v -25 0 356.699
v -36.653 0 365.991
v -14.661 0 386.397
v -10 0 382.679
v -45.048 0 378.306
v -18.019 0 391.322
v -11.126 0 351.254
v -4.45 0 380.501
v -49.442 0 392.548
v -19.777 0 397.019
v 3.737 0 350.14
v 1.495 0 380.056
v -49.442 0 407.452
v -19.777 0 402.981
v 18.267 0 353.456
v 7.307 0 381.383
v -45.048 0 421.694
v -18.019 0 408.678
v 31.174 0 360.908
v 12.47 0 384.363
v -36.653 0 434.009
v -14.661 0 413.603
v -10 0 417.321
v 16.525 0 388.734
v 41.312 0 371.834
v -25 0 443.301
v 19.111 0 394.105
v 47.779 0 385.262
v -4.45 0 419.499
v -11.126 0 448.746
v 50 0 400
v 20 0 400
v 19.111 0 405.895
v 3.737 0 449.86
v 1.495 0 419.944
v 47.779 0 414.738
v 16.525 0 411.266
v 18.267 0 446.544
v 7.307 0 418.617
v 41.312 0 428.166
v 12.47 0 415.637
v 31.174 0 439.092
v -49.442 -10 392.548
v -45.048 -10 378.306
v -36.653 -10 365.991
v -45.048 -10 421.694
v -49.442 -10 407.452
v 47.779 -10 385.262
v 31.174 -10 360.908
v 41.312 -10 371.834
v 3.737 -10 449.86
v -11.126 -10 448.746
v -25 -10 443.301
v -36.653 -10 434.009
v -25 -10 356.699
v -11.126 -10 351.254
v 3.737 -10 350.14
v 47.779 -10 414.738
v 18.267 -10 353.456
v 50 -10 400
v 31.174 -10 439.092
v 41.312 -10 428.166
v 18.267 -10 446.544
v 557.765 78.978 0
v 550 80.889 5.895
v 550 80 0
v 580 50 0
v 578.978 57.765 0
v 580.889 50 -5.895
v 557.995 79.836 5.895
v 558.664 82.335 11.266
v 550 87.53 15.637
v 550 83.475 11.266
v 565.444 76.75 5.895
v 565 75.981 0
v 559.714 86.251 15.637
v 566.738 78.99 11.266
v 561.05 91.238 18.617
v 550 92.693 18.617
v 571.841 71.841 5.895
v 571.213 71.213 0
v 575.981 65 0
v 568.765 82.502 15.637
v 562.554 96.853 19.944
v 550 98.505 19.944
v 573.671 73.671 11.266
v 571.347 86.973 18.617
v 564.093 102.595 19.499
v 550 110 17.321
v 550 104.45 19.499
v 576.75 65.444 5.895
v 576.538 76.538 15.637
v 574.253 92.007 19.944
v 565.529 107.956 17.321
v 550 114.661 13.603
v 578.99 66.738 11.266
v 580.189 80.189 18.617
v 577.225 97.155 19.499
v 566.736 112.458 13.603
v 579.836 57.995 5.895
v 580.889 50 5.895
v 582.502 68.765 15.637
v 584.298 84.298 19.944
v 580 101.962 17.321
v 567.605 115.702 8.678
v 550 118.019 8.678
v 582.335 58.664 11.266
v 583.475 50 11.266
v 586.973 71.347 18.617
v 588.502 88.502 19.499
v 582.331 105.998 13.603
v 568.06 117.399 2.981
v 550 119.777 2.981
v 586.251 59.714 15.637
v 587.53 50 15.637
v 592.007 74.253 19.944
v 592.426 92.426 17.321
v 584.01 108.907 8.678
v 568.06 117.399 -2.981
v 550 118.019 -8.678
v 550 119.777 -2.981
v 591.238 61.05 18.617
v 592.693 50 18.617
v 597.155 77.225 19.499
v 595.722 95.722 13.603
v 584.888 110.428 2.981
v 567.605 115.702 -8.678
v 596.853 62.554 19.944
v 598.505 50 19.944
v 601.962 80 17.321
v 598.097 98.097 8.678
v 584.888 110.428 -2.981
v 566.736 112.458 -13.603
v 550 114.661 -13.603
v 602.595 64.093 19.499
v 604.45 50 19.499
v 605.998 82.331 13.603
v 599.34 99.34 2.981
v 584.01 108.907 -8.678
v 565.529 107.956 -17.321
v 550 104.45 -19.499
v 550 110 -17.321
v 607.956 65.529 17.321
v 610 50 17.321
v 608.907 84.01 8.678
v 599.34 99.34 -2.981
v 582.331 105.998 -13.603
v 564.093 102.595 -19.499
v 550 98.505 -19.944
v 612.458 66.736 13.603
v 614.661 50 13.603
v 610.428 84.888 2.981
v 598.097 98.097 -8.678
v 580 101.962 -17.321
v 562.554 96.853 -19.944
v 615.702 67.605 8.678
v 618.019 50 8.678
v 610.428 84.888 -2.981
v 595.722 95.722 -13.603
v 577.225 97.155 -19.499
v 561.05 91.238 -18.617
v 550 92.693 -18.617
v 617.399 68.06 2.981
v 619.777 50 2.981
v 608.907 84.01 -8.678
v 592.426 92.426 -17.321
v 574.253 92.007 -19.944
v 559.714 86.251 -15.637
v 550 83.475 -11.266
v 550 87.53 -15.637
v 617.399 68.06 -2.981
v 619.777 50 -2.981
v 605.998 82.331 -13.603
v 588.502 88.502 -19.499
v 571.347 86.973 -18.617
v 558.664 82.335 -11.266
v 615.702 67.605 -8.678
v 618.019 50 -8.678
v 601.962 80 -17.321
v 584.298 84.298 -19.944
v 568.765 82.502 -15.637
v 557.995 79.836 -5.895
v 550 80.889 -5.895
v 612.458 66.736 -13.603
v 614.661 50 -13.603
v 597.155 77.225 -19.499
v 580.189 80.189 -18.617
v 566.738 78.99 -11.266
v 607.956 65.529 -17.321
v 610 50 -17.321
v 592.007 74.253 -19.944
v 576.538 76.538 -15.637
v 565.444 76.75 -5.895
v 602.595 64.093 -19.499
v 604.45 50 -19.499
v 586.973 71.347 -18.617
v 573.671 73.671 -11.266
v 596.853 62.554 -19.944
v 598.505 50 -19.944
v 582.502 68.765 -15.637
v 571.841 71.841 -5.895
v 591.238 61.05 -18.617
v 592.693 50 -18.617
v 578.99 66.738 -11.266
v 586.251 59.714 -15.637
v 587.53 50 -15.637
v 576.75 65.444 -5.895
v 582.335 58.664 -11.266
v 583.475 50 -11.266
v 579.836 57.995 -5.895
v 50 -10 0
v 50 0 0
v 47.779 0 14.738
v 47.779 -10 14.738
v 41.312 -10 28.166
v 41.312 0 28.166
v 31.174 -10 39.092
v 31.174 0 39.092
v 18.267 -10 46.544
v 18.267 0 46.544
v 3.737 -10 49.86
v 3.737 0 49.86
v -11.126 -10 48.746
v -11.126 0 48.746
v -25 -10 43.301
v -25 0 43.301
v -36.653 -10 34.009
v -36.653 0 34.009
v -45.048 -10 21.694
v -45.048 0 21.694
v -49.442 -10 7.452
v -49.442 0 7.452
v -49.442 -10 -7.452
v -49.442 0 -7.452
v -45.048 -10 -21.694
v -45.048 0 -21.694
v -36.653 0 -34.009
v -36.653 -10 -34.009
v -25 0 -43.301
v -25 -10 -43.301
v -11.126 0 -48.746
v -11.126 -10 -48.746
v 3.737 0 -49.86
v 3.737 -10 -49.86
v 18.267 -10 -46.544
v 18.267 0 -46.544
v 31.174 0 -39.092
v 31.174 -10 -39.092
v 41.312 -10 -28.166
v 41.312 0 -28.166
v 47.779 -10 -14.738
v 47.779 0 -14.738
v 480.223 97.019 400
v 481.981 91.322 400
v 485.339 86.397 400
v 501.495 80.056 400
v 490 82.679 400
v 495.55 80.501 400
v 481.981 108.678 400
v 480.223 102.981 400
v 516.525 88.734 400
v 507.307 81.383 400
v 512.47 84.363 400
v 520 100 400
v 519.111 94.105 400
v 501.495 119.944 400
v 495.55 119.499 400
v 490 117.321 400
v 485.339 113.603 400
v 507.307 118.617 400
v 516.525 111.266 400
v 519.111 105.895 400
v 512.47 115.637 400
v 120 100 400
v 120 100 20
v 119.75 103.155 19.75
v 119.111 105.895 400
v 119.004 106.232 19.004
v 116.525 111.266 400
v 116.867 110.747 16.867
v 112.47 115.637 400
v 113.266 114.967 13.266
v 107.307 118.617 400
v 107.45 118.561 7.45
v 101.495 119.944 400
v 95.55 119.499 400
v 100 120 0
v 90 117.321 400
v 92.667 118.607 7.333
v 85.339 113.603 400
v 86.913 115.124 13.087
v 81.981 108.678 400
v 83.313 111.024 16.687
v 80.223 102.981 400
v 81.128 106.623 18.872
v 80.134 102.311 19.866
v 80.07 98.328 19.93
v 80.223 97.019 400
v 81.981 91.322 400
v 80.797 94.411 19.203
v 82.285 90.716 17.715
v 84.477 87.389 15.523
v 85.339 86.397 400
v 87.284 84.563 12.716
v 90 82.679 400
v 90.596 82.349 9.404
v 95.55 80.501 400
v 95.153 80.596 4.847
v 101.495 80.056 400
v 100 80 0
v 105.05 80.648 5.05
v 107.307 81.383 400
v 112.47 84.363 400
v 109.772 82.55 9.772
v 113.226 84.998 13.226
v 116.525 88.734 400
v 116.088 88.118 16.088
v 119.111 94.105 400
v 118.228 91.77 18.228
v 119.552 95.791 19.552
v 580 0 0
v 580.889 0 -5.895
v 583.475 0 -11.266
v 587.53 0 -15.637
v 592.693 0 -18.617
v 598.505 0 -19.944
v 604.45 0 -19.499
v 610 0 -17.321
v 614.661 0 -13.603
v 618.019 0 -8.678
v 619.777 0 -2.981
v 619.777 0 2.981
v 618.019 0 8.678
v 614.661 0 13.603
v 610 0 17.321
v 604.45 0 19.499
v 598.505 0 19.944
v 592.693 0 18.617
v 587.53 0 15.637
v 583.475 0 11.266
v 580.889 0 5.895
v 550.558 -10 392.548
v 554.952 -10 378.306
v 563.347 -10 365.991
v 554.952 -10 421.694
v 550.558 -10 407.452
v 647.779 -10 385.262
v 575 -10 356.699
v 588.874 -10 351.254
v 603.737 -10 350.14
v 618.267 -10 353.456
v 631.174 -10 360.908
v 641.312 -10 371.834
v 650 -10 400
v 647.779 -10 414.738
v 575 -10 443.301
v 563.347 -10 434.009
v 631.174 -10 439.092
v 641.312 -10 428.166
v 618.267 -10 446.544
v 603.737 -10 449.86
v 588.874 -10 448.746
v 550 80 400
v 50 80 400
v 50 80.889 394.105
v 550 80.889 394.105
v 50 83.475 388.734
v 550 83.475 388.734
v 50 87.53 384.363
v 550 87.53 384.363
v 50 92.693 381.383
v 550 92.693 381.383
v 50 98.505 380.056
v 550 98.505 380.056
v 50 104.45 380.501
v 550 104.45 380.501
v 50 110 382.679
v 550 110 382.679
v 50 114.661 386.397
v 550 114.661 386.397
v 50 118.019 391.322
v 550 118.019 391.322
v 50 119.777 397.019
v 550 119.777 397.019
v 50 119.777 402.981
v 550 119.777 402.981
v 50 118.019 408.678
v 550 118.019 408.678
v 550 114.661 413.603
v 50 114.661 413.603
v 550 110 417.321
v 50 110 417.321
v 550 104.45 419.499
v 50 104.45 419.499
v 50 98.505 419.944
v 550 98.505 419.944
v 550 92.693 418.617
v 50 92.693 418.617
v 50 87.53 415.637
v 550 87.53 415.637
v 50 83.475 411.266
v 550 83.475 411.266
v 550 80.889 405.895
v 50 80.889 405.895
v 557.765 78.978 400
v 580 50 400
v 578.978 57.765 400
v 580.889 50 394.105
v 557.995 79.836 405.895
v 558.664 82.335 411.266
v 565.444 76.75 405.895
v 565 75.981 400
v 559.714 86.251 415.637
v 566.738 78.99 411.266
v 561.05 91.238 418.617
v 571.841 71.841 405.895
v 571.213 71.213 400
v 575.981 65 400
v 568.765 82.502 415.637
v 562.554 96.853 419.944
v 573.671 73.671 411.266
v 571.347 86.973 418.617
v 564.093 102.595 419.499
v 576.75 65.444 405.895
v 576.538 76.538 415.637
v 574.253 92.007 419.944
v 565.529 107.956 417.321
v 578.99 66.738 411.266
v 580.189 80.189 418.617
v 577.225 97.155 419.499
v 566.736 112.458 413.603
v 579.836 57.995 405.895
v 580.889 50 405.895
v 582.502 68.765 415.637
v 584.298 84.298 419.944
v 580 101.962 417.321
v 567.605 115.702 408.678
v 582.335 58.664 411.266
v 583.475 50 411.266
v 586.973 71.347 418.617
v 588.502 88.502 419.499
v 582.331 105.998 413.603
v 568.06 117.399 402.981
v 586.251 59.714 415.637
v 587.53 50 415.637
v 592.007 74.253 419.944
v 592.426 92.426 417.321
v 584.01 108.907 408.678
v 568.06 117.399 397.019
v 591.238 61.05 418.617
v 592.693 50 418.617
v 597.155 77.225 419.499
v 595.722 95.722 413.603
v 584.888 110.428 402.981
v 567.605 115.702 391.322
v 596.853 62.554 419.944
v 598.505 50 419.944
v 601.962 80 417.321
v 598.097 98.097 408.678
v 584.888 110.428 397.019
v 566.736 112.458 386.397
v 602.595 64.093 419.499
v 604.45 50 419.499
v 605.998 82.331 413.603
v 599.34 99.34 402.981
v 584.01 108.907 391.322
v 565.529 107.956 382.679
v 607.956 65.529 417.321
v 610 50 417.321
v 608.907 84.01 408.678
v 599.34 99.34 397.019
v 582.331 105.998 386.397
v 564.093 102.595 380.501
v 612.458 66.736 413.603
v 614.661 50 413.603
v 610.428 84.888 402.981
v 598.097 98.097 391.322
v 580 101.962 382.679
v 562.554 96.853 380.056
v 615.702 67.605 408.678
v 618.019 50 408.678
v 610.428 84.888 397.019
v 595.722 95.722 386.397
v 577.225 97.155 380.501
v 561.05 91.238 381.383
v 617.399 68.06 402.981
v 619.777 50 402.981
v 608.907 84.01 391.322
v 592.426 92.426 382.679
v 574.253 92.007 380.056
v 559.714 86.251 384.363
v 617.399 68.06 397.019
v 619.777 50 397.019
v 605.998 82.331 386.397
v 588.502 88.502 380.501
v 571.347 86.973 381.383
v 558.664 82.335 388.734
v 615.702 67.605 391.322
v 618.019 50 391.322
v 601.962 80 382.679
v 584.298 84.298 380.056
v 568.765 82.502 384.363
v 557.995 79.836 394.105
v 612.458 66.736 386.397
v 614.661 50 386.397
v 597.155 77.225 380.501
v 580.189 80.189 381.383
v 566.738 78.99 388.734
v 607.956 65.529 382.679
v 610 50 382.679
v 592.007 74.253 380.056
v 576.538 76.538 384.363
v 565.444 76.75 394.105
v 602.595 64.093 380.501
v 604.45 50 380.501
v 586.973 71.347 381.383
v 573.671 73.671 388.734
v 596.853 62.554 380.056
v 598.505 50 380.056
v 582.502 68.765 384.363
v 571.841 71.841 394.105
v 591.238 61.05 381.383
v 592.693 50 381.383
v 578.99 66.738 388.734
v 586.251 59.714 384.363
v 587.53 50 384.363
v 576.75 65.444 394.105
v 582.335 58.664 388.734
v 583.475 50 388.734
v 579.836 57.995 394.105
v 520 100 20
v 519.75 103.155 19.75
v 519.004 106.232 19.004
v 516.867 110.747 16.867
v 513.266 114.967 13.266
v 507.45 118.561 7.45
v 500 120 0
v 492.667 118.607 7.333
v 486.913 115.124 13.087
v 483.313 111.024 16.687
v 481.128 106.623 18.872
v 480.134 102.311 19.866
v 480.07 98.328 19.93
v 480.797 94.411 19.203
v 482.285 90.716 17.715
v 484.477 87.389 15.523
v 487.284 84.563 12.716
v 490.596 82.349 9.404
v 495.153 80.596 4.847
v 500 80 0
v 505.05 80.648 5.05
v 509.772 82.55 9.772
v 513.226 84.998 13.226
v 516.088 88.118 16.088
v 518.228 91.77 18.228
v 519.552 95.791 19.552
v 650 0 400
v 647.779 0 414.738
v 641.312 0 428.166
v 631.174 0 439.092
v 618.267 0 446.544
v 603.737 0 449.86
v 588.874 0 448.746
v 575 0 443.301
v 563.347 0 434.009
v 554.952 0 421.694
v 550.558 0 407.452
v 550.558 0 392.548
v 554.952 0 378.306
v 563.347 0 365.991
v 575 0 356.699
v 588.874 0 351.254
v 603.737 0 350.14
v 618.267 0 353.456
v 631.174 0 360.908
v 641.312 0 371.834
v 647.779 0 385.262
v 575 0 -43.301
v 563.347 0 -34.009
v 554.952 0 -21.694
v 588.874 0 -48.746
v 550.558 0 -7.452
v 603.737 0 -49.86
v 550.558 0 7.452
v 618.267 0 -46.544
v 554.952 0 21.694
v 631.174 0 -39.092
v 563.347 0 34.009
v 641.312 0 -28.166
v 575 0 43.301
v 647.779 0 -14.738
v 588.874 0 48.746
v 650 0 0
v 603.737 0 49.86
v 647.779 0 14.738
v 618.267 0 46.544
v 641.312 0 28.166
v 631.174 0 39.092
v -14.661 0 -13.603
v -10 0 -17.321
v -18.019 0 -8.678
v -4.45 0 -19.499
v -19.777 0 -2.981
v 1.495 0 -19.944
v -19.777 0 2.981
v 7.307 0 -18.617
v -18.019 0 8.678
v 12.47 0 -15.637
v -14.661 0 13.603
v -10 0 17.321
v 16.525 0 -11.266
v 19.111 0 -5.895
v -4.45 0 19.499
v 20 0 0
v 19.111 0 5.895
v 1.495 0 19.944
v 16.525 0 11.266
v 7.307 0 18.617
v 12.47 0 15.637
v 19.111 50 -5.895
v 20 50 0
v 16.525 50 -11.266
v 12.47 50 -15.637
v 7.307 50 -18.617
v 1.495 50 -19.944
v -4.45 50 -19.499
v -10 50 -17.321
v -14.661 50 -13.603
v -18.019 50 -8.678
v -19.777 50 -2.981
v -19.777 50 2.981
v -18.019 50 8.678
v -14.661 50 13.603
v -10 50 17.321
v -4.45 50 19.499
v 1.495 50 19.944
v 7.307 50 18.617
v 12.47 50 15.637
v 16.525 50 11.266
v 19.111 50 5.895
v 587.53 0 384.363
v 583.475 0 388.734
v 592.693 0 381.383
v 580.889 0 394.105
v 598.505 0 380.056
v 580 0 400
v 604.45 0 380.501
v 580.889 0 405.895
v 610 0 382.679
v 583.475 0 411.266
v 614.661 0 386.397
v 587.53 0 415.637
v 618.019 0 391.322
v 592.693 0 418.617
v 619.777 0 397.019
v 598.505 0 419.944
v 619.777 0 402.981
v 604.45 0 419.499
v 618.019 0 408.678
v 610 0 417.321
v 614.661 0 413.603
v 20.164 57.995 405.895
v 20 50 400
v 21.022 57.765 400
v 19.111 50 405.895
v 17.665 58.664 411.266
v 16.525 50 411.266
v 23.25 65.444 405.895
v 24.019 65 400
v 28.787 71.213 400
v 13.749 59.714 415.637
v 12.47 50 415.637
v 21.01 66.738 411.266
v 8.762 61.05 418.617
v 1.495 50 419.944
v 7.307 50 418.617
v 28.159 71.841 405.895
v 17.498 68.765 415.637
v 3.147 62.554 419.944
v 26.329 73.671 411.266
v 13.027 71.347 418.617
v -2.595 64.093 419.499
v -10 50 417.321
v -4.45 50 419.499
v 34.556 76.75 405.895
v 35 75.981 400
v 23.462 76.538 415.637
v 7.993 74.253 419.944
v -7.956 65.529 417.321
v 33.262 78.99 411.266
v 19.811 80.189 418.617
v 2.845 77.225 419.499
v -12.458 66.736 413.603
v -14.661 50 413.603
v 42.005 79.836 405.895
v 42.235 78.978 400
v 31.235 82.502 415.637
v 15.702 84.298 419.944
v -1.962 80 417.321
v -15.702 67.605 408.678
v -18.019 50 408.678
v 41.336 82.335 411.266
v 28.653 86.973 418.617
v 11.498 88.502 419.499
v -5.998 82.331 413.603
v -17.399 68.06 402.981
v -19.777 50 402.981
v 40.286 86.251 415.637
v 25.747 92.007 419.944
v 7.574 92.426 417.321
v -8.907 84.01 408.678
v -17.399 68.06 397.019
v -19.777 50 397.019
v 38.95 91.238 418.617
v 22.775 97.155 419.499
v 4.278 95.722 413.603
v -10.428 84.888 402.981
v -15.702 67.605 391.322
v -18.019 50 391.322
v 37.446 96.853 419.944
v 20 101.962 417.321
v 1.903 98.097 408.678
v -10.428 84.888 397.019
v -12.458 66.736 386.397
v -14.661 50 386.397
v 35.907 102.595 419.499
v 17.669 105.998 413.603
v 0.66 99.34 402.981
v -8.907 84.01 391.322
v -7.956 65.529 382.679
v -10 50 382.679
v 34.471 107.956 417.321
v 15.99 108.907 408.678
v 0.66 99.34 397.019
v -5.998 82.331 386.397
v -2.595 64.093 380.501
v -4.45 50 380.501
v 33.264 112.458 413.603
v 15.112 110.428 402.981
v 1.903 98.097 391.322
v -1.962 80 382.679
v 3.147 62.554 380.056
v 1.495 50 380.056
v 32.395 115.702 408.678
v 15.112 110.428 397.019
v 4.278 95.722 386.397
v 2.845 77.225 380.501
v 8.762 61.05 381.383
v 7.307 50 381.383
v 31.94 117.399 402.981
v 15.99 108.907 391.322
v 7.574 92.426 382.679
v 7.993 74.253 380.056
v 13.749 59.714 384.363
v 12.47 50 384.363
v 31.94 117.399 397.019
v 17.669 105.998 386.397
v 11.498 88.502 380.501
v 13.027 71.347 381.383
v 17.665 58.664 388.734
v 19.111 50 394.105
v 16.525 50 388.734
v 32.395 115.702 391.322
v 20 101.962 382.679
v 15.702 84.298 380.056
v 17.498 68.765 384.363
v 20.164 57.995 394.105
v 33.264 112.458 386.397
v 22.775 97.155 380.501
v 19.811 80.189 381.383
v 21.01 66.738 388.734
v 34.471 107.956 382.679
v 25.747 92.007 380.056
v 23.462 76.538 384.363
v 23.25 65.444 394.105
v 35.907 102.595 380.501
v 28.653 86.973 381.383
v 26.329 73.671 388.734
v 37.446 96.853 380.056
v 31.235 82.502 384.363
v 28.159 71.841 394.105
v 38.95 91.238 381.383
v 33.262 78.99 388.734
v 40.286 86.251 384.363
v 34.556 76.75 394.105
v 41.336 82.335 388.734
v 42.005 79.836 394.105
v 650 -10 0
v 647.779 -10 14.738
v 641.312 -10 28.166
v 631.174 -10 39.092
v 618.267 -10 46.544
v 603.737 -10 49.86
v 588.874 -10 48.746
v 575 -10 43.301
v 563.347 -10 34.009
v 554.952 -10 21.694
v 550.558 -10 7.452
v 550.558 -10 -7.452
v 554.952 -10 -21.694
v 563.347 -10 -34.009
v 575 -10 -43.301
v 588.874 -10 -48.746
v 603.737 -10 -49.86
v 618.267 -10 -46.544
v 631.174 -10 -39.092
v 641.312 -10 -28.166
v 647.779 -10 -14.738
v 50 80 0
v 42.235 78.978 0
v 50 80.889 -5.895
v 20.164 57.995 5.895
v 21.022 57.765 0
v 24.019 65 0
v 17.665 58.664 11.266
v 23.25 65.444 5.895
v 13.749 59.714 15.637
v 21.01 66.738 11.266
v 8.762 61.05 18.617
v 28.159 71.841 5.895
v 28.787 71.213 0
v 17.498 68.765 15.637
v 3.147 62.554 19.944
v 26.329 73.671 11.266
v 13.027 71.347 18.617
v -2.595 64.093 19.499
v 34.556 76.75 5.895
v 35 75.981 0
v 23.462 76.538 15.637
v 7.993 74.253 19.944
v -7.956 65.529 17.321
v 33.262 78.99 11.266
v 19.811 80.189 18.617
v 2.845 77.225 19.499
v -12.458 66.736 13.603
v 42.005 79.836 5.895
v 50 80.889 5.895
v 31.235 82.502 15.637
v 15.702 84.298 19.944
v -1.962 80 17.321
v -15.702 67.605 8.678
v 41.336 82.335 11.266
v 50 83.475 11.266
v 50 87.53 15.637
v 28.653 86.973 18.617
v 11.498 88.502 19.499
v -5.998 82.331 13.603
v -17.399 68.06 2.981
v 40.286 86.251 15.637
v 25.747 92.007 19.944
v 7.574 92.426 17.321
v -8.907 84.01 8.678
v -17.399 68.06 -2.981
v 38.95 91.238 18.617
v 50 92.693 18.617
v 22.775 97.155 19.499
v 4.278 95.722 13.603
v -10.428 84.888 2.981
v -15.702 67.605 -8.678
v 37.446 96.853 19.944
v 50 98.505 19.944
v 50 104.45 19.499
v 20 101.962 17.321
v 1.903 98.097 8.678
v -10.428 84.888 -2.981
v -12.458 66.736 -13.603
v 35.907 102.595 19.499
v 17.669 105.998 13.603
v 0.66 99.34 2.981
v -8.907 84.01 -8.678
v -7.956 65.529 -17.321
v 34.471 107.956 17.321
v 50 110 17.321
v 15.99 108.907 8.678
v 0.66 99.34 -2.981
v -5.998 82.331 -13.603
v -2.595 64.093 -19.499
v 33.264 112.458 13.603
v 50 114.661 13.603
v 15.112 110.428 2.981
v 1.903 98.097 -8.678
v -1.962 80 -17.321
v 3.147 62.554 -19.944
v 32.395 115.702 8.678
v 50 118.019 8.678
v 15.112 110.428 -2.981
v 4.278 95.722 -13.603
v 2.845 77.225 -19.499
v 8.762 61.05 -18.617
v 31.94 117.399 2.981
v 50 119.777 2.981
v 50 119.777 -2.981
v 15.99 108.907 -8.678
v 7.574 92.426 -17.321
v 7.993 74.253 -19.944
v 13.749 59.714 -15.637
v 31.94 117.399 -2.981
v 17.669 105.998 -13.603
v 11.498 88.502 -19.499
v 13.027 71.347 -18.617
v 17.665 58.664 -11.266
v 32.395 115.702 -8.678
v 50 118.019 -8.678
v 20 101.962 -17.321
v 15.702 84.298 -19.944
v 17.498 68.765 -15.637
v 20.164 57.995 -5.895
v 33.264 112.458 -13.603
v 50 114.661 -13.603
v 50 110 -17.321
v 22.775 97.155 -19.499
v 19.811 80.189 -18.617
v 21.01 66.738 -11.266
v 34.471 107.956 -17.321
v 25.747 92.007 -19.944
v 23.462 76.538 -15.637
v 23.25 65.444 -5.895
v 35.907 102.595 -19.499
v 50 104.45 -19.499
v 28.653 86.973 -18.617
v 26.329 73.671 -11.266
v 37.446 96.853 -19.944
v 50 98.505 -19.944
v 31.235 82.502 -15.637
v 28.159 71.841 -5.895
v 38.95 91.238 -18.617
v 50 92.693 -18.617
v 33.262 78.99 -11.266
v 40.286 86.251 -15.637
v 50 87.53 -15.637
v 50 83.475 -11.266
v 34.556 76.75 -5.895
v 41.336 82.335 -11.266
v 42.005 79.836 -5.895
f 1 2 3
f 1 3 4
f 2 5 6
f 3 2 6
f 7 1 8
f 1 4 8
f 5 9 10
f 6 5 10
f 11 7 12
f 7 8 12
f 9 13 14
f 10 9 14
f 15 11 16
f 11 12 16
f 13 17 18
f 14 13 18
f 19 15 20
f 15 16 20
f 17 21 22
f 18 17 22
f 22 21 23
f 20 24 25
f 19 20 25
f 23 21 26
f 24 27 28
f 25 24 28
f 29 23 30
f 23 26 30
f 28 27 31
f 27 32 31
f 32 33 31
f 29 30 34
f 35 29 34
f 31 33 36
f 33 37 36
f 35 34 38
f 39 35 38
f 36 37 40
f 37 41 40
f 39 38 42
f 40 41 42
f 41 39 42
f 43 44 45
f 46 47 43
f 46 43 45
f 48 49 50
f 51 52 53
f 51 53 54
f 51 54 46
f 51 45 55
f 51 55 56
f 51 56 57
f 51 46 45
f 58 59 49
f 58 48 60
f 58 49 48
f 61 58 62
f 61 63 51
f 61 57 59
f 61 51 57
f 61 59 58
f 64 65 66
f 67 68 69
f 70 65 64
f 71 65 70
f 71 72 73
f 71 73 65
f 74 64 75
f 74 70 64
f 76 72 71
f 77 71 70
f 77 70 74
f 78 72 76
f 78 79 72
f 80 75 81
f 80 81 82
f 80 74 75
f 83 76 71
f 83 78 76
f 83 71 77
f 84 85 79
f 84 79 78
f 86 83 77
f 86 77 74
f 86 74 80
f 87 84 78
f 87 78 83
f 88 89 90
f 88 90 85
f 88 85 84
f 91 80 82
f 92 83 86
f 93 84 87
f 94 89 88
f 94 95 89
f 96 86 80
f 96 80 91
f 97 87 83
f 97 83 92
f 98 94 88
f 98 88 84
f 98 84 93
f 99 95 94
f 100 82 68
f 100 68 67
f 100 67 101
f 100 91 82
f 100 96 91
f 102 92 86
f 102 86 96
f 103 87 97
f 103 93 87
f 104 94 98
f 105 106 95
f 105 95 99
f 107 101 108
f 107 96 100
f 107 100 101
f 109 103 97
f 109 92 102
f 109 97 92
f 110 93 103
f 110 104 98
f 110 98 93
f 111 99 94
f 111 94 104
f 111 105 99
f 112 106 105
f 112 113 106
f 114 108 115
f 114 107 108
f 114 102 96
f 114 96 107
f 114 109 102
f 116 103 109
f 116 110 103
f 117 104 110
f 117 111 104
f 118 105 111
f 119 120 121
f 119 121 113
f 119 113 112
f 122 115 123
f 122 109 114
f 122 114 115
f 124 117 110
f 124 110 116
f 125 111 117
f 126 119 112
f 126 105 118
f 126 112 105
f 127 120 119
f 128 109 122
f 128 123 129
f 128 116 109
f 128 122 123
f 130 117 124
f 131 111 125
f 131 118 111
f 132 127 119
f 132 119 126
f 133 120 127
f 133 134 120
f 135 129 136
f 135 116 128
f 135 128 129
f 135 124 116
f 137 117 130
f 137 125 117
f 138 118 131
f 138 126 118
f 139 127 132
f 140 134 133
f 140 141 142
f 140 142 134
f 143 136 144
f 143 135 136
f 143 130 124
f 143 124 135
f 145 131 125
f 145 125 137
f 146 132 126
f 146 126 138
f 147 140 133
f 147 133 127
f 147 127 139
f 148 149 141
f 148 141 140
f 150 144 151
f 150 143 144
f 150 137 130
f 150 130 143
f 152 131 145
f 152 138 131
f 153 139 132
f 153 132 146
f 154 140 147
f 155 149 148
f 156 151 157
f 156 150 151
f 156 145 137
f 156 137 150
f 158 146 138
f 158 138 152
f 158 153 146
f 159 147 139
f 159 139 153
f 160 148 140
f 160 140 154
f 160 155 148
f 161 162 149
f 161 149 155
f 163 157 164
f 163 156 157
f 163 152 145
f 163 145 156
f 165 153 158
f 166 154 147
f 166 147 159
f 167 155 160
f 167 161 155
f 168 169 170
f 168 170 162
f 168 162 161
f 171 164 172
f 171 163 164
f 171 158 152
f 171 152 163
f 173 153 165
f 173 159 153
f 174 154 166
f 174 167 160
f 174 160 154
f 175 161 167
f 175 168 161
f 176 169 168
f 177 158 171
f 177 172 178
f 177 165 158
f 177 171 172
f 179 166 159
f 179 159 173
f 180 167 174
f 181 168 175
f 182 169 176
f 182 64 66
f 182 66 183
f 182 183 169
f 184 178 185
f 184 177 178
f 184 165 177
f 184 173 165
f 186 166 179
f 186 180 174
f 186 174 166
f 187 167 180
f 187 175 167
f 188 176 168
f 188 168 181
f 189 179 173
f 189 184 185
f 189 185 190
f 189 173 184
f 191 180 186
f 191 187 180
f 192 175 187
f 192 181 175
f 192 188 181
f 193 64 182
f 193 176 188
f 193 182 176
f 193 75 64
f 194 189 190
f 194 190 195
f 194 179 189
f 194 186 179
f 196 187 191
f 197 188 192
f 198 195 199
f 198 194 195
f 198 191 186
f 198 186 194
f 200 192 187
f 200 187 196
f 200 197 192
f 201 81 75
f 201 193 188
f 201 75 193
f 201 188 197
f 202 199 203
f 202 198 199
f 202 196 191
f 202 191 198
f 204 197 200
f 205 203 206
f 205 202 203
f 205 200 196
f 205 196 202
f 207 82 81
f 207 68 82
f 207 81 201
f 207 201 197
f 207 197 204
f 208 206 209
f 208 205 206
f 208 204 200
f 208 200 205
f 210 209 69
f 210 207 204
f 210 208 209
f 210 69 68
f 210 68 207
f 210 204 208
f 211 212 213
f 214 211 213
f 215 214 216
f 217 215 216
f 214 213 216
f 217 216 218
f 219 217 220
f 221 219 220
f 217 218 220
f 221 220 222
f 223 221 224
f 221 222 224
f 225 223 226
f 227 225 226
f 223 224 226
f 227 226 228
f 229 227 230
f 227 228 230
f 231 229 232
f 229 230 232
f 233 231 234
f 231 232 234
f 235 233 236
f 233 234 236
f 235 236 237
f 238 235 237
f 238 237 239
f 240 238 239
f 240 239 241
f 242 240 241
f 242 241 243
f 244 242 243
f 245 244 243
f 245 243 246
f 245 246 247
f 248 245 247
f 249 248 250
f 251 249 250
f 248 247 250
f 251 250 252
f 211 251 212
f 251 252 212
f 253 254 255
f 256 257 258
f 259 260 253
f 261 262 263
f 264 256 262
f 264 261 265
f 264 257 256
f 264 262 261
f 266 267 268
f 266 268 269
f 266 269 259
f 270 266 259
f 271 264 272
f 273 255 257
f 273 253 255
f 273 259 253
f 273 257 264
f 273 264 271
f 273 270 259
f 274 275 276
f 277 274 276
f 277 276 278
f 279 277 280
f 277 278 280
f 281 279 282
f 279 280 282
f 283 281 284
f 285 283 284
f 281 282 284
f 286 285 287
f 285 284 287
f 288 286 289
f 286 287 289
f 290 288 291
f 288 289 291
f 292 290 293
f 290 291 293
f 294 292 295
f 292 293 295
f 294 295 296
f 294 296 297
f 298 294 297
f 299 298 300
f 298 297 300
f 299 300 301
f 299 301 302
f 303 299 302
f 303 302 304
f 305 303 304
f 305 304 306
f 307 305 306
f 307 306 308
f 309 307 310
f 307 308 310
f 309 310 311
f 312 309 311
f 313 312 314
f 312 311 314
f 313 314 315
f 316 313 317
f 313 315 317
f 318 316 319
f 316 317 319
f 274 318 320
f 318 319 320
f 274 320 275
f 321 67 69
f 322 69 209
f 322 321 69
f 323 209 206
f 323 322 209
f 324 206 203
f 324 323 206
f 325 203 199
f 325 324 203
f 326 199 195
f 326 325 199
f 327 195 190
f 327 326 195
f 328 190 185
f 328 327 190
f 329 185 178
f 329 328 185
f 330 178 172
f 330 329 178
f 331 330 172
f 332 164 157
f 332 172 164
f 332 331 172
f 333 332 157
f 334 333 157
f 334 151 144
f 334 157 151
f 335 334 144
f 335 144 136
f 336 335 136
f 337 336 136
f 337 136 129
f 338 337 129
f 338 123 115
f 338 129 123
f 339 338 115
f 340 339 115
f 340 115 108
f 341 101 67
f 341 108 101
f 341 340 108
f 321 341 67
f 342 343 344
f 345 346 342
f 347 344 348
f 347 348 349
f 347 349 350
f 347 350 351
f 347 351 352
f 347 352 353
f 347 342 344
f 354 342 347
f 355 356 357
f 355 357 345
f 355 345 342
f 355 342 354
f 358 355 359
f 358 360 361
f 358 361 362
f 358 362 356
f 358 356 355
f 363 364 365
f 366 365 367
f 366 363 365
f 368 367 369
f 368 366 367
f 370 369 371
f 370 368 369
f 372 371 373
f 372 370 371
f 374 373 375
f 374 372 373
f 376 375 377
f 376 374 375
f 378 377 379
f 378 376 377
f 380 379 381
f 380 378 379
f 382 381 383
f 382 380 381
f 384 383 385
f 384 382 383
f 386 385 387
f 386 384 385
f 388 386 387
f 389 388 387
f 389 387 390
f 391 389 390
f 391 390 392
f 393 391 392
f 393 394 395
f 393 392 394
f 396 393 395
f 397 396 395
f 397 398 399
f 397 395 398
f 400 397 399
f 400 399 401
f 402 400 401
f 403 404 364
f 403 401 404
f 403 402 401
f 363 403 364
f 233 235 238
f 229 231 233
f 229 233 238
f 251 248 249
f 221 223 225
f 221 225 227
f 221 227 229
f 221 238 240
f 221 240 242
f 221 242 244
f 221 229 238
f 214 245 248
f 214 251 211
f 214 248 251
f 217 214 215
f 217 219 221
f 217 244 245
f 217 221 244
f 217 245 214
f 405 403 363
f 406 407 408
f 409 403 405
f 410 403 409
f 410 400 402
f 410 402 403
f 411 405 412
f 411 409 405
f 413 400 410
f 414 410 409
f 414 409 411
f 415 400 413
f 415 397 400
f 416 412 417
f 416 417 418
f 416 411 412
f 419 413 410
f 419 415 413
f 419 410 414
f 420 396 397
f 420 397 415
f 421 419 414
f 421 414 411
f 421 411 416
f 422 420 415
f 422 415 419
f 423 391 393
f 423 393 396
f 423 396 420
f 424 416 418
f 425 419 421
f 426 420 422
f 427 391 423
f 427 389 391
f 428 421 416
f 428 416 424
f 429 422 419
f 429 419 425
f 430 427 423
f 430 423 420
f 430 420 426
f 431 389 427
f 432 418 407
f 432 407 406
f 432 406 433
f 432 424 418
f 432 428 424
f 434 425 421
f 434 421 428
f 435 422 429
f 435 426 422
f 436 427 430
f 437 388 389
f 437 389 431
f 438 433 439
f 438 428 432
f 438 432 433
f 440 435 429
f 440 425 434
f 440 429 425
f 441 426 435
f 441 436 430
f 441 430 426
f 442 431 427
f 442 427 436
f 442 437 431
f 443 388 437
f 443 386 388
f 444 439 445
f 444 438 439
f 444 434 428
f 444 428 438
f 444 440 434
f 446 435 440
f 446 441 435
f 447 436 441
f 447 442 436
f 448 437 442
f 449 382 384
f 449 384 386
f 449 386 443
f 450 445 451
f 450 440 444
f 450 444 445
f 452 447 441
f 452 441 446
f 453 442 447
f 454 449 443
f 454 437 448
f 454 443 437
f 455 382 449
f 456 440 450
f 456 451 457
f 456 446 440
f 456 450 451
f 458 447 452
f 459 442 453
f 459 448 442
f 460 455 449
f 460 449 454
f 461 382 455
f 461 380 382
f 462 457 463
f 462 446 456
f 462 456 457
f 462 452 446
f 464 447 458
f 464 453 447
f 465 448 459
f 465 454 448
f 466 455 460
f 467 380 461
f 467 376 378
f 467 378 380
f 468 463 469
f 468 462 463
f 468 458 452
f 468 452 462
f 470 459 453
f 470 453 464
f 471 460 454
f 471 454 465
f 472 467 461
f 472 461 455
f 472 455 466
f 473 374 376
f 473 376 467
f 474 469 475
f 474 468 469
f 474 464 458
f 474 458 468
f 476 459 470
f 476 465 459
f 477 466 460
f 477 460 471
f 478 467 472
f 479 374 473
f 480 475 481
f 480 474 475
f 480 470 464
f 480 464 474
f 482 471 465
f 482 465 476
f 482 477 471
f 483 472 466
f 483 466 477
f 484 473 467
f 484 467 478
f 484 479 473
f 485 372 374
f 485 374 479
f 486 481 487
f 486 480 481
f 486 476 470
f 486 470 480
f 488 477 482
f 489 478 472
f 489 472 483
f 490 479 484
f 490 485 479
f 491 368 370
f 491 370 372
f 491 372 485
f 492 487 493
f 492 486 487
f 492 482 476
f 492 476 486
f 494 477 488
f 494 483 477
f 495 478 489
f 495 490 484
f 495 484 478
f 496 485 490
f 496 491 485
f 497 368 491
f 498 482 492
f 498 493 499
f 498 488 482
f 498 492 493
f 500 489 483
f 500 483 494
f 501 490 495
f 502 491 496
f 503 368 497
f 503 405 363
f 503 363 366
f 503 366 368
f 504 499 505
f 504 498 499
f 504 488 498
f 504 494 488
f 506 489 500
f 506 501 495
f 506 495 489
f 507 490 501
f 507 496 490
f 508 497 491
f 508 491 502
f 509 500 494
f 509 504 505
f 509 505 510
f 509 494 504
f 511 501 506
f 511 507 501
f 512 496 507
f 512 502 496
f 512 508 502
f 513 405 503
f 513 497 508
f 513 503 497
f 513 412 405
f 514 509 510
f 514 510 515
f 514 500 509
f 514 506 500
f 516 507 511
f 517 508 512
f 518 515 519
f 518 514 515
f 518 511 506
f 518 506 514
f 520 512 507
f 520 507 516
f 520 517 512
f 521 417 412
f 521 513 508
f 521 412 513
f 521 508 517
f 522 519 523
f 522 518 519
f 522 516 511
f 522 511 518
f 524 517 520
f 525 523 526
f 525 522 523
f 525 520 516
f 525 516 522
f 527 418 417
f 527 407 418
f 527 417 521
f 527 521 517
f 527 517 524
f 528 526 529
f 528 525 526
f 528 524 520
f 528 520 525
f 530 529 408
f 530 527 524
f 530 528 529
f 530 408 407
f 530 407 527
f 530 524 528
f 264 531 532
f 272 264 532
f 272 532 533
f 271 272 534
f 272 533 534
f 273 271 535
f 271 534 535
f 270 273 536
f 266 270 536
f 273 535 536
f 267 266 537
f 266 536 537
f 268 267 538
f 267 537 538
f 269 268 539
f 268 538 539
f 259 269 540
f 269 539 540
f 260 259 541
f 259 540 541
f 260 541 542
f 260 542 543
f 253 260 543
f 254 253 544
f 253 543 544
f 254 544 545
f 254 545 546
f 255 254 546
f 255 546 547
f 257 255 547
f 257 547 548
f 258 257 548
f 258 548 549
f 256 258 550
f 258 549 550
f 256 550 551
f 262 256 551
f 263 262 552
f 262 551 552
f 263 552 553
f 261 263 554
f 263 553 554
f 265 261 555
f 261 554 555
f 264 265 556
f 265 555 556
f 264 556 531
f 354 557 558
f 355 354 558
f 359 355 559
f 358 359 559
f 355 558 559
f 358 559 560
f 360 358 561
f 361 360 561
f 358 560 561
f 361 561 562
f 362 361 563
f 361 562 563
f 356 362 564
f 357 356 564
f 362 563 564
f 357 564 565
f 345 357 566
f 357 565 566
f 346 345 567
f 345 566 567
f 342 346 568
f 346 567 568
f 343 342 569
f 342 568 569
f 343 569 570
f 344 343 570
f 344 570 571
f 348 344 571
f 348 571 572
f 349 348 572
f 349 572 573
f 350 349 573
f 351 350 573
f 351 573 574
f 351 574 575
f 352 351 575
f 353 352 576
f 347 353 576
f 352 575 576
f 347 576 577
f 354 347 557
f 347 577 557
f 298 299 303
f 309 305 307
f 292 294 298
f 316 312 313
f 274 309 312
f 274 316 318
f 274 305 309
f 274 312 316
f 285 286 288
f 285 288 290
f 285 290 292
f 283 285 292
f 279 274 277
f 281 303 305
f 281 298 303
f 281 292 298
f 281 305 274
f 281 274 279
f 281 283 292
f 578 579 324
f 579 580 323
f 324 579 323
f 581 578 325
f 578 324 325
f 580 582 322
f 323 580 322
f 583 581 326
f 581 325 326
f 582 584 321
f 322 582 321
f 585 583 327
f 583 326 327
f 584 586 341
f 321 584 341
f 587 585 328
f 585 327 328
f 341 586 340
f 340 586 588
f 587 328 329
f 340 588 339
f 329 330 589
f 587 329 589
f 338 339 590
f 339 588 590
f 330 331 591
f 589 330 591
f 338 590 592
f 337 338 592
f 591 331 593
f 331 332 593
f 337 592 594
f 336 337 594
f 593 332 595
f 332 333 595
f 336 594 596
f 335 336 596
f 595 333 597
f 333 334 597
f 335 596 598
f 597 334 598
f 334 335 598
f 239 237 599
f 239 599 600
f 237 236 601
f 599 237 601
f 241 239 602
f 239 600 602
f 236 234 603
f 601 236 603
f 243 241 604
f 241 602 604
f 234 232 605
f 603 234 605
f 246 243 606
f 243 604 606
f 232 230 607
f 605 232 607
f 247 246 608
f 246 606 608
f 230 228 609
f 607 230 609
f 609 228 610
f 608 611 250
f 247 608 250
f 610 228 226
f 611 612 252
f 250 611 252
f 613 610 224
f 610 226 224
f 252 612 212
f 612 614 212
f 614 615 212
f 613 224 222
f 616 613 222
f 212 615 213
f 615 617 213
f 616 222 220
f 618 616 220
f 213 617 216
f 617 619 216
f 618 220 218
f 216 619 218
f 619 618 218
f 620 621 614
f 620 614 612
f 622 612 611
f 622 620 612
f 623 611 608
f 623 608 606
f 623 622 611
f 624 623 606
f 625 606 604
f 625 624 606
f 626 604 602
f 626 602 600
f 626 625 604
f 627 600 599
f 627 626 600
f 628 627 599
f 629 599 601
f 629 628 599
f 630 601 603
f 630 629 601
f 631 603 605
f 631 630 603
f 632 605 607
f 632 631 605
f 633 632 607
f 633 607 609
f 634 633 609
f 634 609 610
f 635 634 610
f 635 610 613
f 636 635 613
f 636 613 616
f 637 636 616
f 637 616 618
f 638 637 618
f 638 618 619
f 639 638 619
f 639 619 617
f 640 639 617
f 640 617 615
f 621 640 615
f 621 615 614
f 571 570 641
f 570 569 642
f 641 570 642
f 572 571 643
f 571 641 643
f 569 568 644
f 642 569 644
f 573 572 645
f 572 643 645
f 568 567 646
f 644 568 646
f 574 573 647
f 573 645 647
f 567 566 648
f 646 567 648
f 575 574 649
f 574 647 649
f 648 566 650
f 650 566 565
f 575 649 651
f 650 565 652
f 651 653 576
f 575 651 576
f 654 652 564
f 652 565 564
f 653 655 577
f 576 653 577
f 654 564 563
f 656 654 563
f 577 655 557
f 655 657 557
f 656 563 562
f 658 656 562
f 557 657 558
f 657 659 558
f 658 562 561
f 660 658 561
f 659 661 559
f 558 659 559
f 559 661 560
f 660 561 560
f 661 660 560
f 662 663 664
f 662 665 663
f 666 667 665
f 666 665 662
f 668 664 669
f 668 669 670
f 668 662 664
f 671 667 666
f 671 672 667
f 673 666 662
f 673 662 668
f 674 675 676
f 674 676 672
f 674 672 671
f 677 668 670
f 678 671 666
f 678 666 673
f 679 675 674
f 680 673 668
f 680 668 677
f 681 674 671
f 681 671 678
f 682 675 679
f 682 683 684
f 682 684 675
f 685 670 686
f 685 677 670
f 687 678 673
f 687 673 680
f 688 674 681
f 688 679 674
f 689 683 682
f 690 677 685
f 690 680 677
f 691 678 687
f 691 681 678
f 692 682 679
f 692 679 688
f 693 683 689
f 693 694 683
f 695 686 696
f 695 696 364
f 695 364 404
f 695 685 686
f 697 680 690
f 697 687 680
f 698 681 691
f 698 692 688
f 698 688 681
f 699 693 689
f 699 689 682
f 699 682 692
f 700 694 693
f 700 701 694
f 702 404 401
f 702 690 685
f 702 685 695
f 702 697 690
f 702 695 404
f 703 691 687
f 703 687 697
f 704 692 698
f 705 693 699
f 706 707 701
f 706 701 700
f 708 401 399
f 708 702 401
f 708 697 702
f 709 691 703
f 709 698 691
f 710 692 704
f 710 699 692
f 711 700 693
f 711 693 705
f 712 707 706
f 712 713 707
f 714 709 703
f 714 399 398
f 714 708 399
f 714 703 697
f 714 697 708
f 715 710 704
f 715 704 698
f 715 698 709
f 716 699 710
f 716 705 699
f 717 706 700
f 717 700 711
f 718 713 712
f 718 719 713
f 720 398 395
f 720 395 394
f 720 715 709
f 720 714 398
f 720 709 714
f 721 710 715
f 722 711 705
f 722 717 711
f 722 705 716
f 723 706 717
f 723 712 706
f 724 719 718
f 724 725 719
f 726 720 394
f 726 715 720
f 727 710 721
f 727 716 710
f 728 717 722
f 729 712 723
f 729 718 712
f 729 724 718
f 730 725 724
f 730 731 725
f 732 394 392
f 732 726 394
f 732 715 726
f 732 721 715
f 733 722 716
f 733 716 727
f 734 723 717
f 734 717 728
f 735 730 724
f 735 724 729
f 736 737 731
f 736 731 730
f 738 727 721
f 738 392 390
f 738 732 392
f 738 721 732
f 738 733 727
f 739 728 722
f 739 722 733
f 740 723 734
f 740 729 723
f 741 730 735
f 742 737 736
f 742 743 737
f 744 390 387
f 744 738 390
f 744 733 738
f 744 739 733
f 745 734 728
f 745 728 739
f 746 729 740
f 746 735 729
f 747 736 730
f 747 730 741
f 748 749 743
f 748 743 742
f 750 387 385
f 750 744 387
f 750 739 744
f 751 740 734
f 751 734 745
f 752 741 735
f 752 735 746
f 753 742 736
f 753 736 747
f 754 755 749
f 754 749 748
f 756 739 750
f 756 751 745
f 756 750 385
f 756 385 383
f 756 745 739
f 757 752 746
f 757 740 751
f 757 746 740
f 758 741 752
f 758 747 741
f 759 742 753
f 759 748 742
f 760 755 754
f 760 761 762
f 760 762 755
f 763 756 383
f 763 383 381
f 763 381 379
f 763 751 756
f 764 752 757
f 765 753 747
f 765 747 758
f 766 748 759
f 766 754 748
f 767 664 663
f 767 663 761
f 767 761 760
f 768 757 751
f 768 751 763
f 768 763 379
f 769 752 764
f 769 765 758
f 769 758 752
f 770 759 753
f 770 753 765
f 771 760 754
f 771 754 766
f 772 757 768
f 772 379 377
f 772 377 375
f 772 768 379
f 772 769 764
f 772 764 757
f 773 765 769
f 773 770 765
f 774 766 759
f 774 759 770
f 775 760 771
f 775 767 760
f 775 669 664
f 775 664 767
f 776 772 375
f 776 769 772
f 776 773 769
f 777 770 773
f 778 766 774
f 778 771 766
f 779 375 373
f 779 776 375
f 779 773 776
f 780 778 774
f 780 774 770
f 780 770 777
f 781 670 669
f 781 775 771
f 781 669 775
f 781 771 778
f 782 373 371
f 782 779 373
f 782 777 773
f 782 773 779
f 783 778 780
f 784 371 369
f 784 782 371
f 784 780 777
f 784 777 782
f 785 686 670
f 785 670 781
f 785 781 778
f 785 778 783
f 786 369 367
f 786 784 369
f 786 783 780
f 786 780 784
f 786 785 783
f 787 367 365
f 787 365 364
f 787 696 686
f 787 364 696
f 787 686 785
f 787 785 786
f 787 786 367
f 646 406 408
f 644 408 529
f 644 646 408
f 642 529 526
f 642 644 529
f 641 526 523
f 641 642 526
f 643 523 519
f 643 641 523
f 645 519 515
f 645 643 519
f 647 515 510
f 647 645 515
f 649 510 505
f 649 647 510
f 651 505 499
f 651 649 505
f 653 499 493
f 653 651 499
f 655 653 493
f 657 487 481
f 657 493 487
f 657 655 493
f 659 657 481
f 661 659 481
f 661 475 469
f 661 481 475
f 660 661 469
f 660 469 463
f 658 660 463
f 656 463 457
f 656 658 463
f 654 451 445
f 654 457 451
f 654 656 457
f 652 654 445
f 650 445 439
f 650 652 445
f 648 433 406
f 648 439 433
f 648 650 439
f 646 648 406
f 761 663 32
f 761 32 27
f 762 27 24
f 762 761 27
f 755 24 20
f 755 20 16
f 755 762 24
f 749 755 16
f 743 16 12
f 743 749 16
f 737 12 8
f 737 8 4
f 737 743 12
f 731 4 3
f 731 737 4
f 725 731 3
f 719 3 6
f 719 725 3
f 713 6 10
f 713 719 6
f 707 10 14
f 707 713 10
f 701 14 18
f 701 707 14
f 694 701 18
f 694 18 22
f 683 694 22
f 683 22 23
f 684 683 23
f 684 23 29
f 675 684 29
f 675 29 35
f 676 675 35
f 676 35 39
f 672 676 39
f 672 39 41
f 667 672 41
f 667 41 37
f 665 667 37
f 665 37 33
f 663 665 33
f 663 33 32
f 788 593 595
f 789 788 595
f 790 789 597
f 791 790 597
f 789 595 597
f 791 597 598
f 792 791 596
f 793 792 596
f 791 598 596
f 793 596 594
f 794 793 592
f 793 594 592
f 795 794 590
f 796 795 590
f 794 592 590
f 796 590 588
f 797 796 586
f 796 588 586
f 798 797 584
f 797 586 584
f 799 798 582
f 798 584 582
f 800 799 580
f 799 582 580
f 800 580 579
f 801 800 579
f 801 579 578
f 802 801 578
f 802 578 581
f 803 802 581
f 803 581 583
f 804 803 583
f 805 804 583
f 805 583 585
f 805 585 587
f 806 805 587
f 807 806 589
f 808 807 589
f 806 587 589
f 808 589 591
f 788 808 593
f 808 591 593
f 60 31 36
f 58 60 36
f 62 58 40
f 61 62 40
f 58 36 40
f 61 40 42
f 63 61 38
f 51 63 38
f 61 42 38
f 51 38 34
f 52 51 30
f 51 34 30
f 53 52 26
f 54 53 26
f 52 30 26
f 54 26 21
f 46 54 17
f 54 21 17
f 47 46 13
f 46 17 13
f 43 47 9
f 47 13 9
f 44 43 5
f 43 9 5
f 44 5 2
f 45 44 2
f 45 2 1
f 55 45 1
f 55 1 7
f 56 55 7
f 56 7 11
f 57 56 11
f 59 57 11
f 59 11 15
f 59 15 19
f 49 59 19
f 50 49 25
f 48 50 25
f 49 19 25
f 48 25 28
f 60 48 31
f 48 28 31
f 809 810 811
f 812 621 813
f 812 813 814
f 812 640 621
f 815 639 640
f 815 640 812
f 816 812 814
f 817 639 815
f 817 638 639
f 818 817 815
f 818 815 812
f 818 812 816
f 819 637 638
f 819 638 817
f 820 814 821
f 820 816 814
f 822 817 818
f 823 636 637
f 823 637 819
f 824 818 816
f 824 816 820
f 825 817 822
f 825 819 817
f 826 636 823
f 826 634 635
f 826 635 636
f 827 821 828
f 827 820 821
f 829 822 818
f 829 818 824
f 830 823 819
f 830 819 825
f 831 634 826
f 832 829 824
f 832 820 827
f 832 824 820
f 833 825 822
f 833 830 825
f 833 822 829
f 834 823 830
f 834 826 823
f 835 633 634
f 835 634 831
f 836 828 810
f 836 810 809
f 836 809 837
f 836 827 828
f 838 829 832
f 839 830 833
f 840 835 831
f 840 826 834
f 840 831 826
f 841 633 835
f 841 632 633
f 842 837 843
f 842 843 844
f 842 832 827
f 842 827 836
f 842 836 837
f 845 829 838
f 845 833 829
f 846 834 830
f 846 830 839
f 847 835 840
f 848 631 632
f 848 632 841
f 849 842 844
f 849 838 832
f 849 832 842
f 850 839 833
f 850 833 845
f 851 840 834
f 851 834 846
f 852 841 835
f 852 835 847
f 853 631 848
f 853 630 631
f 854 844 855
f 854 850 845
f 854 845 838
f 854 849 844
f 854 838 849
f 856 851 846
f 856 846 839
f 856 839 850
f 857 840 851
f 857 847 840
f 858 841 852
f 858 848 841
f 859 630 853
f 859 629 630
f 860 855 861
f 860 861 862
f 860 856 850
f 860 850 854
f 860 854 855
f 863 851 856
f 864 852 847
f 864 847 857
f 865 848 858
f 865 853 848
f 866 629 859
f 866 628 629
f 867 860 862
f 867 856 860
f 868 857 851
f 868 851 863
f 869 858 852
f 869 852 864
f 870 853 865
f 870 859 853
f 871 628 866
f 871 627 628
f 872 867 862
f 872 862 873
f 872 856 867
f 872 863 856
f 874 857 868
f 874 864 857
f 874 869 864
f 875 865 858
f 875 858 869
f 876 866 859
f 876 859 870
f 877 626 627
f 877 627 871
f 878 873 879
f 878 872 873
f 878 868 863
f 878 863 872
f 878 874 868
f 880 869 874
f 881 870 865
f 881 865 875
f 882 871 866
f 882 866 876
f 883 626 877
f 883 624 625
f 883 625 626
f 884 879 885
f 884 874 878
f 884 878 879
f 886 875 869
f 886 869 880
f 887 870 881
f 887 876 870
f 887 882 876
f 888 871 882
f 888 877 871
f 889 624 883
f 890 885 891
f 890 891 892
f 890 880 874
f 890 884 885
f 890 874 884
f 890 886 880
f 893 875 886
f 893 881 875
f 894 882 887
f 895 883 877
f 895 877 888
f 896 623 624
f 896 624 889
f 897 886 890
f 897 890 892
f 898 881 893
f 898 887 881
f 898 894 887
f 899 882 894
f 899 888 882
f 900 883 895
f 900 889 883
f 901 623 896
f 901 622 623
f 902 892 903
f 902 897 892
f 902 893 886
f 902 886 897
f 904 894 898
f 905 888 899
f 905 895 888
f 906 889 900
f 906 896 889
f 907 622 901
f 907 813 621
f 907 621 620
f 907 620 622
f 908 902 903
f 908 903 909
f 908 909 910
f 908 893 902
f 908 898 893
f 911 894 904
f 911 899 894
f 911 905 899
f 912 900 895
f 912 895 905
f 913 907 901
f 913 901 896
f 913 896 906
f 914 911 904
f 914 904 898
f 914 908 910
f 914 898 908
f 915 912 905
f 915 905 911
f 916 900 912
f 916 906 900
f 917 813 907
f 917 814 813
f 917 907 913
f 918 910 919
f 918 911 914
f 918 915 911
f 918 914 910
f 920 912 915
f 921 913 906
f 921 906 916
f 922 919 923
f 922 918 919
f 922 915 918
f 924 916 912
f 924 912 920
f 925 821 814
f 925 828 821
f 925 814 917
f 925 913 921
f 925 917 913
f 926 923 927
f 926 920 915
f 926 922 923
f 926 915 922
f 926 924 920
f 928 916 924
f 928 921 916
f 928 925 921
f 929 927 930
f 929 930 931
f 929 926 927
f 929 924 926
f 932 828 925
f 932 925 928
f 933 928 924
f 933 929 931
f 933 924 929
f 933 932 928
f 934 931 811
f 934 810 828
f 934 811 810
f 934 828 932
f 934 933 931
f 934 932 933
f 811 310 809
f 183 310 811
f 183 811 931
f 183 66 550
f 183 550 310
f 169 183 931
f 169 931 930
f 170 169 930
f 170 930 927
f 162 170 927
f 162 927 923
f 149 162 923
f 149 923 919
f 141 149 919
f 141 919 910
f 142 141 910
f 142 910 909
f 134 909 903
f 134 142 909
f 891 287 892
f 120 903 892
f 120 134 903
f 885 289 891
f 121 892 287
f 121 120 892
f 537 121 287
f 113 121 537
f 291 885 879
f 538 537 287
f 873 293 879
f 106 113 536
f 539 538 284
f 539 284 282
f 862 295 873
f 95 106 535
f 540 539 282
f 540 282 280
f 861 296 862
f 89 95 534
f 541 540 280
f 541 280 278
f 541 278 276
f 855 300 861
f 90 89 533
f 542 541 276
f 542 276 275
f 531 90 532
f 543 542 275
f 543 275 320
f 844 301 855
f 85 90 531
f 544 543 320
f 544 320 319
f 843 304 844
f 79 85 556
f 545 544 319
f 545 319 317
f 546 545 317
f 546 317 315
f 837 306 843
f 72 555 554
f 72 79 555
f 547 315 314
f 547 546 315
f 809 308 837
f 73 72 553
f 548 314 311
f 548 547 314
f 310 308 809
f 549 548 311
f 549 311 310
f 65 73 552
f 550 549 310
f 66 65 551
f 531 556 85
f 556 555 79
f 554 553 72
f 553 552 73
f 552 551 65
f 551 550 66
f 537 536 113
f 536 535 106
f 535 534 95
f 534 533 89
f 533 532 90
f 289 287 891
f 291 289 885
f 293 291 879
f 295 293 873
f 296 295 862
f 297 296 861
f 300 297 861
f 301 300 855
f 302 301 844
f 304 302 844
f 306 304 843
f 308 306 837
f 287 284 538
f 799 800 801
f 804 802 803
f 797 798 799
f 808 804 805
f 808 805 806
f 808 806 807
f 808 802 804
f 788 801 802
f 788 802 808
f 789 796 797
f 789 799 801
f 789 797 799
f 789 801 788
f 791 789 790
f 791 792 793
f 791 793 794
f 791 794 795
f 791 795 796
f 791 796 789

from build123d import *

# Parameters (mm, degrees)
SKETCH3_R           = 20
SKETCH4_R           = 50
BOSS_EXTRUDE1_DEPTH = 10
SKETCH7_R           = 20
SKETCH9_R           = 50
BOSS_EXTRUDE2_DEPTH = 10
SKETCH11_R          = 20
BOSS_EXTRUDE3_DEPTH = 400


with BuildPart() as part:
    # Sweep1: sweep along a path in Sketch2
    with BuildLine(Plane.XY) as sweep1_path:
        Line((0, 0), (0, 50))
        ThreePointArc((0, 50), (14.644660941, 85.355339059), (50, 100))
        Line((50, 100), (550, 100))
        ThreePointArc((550, 100), (585.355339059, 85.355339059), (600, 50))
        Line((600, 50), (600, 0))
    # Sketch3 → Sweep1 (sweep)
    with BuildSketch(Plane(origin=(0, 0, 0), x_dir=(1, 0, 0), z_dir=(0, 1, 0))):
        Circle(SKETCH3_R)
    sweep(path=sweep1_path.line)

    # Sketch4 → Boss-Extrude1 (add)
    with BuildSketch(Plane.XZ):
        Circle(SKETCH4_R)
        with Locations((600, 0)):
            Circle(SKETCH4_R)
    extrude(amount=BOSS_EXTRUDE1_DEPTH)

    # Sketch11 → Boss-Extrude3 (add)
    with BuildSketch(Plane.XY):
        with Locations((100, 100)):
            Circle(SKETCH11_R)
        with Locations((500, 100)):
            Circle(SKETCH11_R)
    extrude(amount=BOSS_EXTRUDE3_DEPTH)


with BuildPart() as body_2:
    # Sweep2: sweep along a path in Sketch5
    with BuildLine(Plane.XY.offset(400)) as sweep2_path:
        Line((0, 0), (0, 50))
        ThreePointArc((0, 50), (14.644660941, 85.355339059), (50, 100))
        Line((50, 100), (550, 100))
        ThreePointArc((550, 100), (585.355339059, 85.355339059), (600, 50))
        Line((600, 50), (600, -10))
    # Sketch7 → Sweep2 (sweep)
    with BuildSketch(Plane(origin=(0, 0, 0), x_dir=(1, 0, 0), z_dir=(0, 1, 0))):
        with Locations((0, -400)):
            Circle(SKETCH7_R)
    sweep(path=sweep2_path.line)

    # Sketch9 → Boss-Extrude2 (add)
    with BuildSketch(Plane.XZ):
        with Locations((0, 400)):
            Circle(SKETCH9_R)
        with Locations((600, 400)):
            Circle(SKETCH9_R)
    extrude(amount=BOSS_EXTRUDE2_DEPTH)


solid = Compound([part.part, body_2.part])
